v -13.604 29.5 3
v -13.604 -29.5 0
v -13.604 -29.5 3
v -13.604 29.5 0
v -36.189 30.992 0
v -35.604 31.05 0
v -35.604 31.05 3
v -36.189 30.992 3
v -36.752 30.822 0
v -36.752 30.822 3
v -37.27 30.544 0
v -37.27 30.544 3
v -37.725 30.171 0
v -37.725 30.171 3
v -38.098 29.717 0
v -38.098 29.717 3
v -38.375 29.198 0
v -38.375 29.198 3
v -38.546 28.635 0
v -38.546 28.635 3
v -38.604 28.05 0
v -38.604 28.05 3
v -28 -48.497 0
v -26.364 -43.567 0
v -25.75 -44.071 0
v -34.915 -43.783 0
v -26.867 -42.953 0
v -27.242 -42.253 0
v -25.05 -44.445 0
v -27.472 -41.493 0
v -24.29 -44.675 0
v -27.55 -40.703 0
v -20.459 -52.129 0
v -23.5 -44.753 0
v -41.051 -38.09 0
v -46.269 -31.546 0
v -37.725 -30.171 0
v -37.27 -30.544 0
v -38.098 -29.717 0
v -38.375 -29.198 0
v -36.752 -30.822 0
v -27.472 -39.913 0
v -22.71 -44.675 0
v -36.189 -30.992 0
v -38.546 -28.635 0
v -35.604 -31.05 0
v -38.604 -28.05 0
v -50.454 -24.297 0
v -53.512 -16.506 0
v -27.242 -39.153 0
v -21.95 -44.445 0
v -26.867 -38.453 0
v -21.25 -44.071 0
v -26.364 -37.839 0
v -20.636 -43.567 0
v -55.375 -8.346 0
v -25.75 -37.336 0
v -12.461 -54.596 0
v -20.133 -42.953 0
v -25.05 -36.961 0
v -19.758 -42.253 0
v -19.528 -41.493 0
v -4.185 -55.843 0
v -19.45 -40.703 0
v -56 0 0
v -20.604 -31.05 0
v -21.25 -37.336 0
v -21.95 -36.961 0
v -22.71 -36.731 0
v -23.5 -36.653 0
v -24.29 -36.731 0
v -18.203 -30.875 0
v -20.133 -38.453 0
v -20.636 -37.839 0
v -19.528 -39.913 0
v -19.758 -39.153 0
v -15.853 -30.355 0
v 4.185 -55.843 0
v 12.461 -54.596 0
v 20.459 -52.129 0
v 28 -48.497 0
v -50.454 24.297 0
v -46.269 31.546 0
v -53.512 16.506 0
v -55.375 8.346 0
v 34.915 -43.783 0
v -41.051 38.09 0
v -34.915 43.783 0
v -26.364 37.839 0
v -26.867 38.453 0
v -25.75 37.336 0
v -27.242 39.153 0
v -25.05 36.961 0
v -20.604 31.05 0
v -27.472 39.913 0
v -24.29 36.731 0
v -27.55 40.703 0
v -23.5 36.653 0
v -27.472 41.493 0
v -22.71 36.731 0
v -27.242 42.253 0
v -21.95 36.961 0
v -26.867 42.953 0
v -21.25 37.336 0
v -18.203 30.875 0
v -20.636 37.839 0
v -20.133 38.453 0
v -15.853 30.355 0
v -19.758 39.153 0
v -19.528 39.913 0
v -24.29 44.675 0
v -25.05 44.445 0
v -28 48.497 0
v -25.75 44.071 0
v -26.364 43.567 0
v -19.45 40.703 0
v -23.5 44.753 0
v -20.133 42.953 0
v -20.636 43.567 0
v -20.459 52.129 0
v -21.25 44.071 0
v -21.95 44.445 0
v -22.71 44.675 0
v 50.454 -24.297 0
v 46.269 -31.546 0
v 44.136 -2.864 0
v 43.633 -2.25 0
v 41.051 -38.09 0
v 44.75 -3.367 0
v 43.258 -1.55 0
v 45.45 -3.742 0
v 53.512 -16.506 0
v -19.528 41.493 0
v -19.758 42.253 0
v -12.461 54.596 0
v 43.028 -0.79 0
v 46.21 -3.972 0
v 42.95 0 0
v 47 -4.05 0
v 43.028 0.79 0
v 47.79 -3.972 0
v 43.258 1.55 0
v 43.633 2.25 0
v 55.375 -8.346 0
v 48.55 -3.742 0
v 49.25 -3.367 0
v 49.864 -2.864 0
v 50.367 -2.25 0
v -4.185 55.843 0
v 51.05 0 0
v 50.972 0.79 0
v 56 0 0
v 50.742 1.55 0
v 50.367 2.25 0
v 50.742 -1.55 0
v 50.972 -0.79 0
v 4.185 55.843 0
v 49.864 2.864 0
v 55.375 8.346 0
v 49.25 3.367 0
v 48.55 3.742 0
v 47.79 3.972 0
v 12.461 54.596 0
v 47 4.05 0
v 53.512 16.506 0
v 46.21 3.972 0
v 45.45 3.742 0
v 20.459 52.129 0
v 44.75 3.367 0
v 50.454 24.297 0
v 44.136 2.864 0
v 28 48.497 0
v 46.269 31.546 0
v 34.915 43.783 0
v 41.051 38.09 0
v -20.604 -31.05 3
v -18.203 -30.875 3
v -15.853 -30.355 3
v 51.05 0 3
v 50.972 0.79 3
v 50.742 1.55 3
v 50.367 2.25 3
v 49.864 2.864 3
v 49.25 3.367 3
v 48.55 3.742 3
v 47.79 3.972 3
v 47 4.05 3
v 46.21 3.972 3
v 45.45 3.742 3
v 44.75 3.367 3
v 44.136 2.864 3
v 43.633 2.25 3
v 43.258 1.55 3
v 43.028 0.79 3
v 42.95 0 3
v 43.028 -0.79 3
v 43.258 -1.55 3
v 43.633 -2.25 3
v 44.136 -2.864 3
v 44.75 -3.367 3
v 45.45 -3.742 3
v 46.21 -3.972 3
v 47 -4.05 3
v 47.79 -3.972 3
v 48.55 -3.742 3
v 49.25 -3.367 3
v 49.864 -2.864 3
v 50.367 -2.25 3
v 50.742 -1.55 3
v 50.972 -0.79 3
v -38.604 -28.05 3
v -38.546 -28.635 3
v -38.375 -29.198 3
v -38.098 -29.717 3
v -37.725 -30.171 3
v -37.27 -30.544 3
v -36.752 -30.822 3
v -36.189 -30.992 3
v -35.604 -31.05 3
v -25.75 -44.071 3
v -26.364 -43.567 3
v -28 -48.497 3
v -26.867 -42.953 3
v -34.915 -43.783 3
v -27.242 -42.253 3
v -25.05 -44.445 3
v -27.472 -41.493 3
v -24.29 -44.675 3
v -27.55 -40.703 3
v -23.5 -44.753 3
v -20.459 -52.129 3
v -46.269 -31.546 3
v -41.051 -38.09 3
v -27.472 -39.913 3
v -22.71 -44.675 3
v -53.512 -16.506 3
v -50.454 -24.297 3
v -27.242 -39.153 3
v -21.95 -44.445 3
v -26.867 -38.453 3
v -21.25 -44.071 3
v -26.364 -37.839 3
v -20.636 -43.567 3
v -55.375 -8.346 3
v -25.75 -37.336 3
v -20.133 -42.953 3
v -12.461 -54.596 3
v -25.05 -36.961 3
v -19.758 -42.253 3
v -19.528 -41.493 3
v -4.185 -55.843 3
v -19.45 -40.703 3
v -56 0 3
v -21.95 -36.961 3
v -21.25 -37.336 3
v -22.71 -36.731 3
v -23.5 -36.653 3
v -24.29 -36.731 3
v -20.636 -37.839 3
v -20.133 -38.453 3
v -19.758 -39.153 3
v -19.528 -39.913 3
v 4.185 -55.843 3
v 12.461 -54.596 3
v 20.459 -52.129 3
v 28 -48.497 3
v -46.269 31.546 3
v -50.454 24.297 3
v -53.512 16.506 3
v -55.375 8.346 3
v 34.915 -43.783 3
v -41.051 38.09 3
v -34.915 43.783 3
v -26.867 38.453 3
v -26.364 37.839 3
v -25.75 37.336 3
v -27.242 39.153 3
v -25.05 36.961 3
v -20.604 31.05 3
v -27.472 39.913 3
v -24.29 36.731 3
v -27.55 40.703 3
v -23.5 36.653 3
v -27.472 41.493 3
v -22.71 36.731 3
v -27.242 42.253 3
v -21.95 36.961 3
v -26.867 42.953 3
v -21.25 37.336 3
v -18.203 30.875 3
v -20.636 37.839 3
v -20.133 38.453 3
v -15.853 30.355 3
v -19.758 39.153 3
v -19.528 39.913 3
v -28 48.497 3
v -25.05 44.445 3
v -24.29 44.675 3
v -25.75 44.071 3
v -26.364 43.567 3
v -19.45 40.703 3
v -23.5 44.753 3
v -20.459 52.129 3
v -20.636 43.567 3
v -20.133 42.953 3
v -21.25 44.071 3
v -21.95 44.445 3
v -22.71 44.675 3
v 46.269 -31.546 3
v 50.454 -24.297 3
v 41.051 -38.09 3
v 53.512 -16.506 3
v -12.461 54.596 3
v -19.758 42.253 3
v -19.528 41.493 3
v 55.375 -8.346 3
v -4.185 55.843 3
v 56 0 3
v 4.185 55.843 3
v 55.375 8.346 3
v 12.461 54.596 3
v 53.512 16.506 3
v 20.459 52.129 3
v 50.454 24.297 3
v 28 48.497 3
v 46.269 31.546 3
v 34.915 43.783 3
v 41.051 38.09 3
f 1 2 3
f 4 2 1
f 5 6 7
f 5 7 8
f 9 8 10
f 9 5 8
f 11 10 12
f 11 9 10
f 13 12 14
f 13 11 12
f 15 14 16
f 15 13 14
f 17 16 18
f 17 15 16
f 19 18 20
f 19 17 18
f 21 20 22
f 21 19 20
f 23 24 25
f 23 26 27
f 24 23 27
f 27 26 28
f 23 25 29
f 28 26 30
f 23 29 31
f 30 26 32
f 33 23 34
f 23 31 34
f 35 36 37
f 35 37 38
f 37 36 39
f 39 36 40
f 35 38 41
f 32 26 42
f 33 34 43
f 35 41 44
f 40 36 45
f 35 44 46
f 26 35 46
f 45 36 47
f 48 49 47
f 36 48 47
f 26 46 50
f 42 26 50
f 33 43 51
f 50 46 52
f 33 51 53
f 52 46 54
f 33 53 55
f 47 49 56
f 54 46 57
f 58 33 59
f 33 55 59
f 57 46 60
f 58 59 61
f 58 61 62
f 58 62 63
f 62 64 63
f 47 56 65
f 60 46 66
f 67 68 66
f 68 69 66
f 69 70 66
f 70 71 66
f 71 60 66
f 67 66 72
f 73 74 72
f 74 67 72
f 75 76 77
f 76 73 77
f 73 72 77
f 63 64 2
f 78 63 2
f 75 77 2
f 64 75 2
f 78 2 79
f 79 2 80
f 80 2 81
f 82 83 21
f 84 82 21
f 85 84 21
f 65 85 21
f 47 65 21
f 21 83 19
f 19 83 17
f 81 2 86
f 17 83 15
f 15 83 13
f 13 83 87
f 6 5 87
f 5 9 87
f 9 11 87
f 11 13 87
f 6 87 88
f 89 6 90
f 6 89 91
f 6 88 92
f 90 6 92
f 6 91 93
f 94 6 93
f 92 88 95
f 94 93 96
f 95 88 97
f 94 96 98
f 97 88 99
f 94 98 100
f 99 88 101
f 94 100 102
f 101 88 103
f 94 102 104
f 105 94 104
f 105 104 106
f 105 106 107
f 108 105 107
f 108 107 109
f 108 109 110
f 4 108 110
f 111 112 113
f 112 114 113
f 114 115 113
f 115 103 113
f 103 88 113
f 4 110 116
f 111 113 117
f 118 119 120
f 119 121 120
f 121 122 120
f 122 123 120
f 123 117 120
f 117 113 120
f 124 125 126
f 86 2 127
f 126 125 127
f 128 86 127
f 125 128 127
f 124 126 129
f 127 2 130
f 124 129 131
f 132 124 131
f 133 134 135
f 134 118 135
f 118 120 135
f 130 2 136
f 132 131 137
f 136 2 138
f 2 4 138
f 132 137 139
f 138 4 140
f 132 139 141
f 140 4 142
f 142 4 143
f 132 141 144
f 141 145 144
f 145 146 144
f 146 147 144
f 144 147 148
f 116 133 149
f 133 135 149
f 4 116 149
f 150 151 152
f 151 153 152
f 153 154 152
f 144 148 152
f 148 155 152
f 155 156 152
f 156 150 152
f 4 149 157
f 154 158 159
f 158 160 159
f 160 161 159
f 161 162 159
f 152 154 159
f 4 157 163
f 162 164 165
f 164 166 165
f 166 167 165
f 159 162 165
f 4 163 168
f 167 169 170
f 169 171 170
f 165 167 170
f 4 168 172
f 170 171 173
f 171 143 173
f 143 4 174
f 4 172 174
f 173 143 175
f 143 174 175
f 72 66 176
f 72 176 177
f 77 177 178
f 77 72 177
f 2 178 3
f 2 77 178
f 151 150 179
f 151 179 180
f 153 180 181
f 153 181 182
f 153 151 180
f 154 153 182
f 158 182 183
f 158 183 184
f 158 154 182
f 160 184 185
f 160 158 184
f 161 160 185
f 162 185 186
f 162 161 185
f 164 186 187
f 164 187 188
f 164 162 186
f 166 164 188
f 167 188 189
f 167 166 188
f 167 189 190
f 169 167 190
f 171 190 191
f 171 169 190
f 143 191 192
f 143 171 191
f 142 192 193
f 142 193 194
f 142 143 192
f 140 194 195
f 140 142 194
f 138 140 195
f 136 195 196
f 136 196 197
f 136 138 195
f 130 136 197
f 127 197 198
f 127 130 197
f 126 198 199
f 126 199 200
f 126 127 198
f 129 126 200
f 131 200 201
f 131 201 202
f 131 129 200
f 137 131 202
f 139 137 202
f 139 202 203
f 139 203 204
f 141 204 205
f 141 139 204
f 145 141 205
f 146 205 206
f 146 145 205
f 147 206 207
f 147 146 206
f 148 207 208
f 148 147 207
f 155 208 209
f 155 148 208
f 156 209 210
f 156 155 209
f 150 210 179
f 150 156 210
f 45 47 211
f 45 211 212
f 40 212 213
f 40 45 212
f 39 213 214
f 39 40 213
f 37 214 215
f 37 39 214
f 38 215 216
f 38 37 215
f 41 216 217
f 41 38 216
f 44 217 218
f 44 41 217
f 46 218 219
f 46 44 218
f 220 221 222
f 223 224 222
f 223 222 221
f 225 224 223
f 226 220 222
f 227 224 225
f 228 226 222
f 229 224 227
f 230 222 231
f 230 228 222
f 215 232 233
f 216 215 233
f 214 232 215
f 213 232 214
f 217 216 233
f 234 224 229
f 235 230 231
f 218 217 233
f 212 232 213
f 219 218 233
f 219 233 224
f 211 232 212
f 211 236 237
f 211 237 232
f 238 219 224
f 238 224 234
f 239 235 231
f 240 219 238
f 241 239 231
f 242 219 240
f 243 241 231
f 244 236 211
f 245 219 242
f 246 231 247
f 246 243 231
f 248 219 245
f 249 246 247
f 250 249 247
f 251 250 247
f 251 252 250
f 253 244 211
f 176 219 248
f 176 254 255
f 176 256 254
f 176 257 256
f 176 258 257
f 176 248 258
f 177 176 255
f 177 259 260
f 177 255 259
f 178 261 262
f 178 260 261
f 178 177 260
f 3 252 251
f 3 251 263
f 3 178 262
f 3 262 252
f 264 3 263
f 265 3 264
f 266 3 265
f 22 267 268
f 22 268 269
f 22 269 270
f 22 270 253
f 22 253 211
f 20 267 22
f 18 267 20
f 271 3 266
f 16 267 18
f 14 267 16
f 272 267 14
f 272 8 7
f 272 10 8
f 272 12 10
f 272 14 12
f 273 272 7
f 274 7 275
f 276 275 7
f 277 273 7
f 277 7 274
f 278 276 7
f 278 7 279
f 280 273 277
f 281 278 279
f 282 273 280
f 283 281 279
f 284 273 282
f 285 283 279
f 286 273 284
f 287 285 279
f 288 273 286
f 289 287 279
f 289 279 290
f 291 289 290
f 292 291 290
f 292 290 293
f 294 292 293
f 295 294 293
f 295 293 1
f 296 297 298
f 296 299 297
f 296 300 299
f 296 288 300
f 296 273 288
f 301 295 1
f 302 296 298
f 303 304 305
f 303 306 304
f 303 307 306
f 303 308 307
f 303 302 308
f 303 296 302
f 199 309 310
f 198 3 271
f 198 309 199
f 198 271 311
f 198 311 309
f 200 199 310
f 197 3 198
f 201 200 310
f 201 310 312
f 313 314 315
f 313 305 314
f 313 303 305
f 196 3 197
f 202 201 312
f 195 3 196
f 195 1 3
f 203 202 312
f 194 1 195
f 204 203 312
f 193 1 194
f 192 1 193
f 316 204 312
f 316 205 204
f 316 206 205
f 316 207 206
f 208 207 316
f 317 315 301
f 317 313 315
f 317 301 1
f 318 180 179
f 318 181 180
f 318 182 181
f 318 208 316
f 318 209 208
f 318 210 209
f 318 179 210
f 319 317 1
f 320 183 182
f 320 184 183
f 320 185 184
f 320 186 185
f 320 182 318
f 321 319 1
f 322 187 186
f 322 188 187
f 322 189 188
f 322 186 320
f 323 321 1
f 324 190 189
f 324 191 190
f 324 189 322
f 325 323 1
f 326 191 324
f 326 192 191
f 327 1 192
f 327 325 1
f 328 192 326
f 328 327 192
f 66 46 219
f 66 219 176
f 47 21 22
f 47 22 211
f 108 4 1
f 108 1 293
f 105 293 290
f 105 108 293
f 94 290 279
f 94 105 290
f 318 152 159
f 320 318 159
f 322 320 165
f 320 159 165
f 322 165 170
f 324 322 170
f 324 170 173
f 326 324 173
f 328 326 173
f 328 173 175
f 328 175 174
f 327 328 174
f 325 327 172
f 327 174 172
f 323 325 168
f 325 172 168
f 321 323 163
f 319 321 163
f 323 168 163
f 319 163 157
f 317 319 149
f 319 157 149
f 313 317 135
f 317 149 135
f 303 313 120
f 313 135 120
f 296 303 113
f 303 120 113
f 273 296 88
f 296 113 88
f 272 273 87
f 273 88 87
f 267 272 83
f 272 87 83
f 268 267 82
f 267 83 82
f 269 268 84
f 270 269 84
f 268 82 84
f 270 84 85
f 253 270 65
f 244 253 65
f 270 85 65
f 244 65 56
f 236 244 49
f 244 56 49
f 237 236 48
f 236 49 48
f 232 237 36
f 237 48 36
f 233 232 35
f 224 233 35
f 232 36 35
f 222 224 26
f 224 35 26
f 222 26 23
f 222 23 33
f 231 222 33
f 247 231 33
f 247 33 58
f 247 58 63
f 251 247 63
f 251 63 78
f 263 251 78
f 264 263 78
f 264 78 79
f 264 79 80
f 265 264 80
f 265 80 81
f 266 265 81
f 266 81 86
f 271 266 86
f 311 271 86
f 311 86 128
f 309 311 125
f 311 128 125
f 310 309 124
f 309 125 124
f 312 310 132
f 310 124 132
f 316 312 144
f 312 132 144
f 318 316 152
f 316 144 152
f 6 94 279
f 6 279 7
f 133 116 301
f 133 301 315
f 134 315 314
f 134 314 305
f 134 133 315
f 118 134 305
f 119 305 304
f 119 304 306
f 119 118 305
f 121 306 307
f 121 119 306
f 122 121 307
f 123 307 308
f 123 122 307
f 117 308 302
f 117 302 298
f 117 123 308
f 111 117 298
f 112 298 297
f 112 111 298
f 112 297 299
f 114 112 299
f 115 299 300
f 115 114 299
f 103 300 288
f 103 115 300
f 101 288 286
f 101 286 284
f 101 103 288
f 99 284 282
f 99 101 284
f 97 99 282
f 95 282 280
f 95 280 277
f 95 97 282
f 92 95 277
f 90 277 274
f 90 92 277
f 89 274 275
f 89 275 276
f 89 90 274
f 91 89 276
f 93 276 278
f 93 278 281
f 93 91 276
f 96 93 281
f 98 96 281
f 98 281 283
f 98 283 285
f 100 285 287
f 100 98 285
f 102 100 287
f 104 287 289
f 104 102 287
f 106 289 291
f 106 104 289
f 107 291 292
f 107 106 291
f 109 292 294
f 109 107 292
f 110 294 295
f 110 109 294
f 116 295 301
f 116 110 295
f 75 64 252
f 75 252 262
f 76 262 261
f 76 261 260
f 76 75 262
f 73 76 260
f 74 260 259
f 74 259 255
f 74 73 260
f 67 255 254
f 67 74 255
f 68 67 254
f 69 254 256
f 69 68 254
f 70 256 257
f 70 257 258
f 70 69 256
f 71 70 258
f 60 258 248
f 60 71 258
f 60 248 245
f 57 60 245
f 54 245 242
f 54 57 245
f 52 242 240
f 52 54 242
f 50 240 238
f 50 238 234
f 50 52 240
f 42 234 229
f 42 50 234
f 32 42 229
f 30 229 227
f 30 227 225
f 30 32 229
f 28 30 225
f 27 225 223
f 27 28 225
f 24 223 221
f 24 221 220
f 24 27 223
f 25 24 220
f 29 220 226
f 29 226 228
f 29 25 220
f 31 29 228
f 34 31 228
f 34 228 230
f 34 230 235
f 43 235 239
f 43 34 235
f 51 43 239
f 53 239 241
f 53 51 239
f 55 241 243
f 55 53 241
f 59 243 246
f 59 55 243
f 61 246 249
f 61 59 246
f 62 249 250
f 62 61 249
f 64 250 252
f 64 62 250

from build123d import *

# Parameters (mm, degrees)
SKETCH1_R           = 56
SKETCH1_R_2         = 4.05
BOSS_EXTRUDE1_DEPTH = 3


with BuildPart() as part:
    # Sketch1 → Boss-Extrude1 (new body)
    with BuildSketch(Plane.XY):
        Circle(SKETCH1_R)
        with Locations((-23.5, 40.703193978)):
            Circle(SKETCH1_R_2, mode=Mode.SUBTRACT)
        with Locations((-23.5, -40.703193978)):
            Circle(SKETCH1_R_2, mode=Mode.SUBTRACT)
        with Locations((47, 0)):
            Circle(SKETCH1_R_2, mode=Mode.SUBTRACT)
        with BuildLine():
            Line((-20.603621104, 31.05), (-35.603621104, 31.05))
            ThreePointArc((-35.603621104, 31.05), (-37.724941448, 30.171320344), (-38.603621104, 28.05))
            Line((-38.603621104, 28.05), (-38.603621104, 2.45))
            Line((-38.603621104, 2.45), (-38.603621104, -28.05))
            ThreePointArc((-38.603621104, -28.05), (-37.724941448, -30.171320344), (-35.603621104, -31.05))
            Line((-35.603621104, -31.05), (-20.603621104, -31.05))
            ThreePointArc((-20.603621104, -31.05), (-17.018844263, -30.657863153), (-13.603621104, -29.5))
            Line((-13.603621104, -29.5), (-13.603621104, 29.5))
            ThreePointArc((-13.603621104, 29.5), (-17.018844263, 30.657863153), (-20.603621104, 31.05))
        make_face(mode=Mode.SUBTRACT)
    extrude(amount=BOSS_EXTRUDE1_DEPTH)


solid = part.part
